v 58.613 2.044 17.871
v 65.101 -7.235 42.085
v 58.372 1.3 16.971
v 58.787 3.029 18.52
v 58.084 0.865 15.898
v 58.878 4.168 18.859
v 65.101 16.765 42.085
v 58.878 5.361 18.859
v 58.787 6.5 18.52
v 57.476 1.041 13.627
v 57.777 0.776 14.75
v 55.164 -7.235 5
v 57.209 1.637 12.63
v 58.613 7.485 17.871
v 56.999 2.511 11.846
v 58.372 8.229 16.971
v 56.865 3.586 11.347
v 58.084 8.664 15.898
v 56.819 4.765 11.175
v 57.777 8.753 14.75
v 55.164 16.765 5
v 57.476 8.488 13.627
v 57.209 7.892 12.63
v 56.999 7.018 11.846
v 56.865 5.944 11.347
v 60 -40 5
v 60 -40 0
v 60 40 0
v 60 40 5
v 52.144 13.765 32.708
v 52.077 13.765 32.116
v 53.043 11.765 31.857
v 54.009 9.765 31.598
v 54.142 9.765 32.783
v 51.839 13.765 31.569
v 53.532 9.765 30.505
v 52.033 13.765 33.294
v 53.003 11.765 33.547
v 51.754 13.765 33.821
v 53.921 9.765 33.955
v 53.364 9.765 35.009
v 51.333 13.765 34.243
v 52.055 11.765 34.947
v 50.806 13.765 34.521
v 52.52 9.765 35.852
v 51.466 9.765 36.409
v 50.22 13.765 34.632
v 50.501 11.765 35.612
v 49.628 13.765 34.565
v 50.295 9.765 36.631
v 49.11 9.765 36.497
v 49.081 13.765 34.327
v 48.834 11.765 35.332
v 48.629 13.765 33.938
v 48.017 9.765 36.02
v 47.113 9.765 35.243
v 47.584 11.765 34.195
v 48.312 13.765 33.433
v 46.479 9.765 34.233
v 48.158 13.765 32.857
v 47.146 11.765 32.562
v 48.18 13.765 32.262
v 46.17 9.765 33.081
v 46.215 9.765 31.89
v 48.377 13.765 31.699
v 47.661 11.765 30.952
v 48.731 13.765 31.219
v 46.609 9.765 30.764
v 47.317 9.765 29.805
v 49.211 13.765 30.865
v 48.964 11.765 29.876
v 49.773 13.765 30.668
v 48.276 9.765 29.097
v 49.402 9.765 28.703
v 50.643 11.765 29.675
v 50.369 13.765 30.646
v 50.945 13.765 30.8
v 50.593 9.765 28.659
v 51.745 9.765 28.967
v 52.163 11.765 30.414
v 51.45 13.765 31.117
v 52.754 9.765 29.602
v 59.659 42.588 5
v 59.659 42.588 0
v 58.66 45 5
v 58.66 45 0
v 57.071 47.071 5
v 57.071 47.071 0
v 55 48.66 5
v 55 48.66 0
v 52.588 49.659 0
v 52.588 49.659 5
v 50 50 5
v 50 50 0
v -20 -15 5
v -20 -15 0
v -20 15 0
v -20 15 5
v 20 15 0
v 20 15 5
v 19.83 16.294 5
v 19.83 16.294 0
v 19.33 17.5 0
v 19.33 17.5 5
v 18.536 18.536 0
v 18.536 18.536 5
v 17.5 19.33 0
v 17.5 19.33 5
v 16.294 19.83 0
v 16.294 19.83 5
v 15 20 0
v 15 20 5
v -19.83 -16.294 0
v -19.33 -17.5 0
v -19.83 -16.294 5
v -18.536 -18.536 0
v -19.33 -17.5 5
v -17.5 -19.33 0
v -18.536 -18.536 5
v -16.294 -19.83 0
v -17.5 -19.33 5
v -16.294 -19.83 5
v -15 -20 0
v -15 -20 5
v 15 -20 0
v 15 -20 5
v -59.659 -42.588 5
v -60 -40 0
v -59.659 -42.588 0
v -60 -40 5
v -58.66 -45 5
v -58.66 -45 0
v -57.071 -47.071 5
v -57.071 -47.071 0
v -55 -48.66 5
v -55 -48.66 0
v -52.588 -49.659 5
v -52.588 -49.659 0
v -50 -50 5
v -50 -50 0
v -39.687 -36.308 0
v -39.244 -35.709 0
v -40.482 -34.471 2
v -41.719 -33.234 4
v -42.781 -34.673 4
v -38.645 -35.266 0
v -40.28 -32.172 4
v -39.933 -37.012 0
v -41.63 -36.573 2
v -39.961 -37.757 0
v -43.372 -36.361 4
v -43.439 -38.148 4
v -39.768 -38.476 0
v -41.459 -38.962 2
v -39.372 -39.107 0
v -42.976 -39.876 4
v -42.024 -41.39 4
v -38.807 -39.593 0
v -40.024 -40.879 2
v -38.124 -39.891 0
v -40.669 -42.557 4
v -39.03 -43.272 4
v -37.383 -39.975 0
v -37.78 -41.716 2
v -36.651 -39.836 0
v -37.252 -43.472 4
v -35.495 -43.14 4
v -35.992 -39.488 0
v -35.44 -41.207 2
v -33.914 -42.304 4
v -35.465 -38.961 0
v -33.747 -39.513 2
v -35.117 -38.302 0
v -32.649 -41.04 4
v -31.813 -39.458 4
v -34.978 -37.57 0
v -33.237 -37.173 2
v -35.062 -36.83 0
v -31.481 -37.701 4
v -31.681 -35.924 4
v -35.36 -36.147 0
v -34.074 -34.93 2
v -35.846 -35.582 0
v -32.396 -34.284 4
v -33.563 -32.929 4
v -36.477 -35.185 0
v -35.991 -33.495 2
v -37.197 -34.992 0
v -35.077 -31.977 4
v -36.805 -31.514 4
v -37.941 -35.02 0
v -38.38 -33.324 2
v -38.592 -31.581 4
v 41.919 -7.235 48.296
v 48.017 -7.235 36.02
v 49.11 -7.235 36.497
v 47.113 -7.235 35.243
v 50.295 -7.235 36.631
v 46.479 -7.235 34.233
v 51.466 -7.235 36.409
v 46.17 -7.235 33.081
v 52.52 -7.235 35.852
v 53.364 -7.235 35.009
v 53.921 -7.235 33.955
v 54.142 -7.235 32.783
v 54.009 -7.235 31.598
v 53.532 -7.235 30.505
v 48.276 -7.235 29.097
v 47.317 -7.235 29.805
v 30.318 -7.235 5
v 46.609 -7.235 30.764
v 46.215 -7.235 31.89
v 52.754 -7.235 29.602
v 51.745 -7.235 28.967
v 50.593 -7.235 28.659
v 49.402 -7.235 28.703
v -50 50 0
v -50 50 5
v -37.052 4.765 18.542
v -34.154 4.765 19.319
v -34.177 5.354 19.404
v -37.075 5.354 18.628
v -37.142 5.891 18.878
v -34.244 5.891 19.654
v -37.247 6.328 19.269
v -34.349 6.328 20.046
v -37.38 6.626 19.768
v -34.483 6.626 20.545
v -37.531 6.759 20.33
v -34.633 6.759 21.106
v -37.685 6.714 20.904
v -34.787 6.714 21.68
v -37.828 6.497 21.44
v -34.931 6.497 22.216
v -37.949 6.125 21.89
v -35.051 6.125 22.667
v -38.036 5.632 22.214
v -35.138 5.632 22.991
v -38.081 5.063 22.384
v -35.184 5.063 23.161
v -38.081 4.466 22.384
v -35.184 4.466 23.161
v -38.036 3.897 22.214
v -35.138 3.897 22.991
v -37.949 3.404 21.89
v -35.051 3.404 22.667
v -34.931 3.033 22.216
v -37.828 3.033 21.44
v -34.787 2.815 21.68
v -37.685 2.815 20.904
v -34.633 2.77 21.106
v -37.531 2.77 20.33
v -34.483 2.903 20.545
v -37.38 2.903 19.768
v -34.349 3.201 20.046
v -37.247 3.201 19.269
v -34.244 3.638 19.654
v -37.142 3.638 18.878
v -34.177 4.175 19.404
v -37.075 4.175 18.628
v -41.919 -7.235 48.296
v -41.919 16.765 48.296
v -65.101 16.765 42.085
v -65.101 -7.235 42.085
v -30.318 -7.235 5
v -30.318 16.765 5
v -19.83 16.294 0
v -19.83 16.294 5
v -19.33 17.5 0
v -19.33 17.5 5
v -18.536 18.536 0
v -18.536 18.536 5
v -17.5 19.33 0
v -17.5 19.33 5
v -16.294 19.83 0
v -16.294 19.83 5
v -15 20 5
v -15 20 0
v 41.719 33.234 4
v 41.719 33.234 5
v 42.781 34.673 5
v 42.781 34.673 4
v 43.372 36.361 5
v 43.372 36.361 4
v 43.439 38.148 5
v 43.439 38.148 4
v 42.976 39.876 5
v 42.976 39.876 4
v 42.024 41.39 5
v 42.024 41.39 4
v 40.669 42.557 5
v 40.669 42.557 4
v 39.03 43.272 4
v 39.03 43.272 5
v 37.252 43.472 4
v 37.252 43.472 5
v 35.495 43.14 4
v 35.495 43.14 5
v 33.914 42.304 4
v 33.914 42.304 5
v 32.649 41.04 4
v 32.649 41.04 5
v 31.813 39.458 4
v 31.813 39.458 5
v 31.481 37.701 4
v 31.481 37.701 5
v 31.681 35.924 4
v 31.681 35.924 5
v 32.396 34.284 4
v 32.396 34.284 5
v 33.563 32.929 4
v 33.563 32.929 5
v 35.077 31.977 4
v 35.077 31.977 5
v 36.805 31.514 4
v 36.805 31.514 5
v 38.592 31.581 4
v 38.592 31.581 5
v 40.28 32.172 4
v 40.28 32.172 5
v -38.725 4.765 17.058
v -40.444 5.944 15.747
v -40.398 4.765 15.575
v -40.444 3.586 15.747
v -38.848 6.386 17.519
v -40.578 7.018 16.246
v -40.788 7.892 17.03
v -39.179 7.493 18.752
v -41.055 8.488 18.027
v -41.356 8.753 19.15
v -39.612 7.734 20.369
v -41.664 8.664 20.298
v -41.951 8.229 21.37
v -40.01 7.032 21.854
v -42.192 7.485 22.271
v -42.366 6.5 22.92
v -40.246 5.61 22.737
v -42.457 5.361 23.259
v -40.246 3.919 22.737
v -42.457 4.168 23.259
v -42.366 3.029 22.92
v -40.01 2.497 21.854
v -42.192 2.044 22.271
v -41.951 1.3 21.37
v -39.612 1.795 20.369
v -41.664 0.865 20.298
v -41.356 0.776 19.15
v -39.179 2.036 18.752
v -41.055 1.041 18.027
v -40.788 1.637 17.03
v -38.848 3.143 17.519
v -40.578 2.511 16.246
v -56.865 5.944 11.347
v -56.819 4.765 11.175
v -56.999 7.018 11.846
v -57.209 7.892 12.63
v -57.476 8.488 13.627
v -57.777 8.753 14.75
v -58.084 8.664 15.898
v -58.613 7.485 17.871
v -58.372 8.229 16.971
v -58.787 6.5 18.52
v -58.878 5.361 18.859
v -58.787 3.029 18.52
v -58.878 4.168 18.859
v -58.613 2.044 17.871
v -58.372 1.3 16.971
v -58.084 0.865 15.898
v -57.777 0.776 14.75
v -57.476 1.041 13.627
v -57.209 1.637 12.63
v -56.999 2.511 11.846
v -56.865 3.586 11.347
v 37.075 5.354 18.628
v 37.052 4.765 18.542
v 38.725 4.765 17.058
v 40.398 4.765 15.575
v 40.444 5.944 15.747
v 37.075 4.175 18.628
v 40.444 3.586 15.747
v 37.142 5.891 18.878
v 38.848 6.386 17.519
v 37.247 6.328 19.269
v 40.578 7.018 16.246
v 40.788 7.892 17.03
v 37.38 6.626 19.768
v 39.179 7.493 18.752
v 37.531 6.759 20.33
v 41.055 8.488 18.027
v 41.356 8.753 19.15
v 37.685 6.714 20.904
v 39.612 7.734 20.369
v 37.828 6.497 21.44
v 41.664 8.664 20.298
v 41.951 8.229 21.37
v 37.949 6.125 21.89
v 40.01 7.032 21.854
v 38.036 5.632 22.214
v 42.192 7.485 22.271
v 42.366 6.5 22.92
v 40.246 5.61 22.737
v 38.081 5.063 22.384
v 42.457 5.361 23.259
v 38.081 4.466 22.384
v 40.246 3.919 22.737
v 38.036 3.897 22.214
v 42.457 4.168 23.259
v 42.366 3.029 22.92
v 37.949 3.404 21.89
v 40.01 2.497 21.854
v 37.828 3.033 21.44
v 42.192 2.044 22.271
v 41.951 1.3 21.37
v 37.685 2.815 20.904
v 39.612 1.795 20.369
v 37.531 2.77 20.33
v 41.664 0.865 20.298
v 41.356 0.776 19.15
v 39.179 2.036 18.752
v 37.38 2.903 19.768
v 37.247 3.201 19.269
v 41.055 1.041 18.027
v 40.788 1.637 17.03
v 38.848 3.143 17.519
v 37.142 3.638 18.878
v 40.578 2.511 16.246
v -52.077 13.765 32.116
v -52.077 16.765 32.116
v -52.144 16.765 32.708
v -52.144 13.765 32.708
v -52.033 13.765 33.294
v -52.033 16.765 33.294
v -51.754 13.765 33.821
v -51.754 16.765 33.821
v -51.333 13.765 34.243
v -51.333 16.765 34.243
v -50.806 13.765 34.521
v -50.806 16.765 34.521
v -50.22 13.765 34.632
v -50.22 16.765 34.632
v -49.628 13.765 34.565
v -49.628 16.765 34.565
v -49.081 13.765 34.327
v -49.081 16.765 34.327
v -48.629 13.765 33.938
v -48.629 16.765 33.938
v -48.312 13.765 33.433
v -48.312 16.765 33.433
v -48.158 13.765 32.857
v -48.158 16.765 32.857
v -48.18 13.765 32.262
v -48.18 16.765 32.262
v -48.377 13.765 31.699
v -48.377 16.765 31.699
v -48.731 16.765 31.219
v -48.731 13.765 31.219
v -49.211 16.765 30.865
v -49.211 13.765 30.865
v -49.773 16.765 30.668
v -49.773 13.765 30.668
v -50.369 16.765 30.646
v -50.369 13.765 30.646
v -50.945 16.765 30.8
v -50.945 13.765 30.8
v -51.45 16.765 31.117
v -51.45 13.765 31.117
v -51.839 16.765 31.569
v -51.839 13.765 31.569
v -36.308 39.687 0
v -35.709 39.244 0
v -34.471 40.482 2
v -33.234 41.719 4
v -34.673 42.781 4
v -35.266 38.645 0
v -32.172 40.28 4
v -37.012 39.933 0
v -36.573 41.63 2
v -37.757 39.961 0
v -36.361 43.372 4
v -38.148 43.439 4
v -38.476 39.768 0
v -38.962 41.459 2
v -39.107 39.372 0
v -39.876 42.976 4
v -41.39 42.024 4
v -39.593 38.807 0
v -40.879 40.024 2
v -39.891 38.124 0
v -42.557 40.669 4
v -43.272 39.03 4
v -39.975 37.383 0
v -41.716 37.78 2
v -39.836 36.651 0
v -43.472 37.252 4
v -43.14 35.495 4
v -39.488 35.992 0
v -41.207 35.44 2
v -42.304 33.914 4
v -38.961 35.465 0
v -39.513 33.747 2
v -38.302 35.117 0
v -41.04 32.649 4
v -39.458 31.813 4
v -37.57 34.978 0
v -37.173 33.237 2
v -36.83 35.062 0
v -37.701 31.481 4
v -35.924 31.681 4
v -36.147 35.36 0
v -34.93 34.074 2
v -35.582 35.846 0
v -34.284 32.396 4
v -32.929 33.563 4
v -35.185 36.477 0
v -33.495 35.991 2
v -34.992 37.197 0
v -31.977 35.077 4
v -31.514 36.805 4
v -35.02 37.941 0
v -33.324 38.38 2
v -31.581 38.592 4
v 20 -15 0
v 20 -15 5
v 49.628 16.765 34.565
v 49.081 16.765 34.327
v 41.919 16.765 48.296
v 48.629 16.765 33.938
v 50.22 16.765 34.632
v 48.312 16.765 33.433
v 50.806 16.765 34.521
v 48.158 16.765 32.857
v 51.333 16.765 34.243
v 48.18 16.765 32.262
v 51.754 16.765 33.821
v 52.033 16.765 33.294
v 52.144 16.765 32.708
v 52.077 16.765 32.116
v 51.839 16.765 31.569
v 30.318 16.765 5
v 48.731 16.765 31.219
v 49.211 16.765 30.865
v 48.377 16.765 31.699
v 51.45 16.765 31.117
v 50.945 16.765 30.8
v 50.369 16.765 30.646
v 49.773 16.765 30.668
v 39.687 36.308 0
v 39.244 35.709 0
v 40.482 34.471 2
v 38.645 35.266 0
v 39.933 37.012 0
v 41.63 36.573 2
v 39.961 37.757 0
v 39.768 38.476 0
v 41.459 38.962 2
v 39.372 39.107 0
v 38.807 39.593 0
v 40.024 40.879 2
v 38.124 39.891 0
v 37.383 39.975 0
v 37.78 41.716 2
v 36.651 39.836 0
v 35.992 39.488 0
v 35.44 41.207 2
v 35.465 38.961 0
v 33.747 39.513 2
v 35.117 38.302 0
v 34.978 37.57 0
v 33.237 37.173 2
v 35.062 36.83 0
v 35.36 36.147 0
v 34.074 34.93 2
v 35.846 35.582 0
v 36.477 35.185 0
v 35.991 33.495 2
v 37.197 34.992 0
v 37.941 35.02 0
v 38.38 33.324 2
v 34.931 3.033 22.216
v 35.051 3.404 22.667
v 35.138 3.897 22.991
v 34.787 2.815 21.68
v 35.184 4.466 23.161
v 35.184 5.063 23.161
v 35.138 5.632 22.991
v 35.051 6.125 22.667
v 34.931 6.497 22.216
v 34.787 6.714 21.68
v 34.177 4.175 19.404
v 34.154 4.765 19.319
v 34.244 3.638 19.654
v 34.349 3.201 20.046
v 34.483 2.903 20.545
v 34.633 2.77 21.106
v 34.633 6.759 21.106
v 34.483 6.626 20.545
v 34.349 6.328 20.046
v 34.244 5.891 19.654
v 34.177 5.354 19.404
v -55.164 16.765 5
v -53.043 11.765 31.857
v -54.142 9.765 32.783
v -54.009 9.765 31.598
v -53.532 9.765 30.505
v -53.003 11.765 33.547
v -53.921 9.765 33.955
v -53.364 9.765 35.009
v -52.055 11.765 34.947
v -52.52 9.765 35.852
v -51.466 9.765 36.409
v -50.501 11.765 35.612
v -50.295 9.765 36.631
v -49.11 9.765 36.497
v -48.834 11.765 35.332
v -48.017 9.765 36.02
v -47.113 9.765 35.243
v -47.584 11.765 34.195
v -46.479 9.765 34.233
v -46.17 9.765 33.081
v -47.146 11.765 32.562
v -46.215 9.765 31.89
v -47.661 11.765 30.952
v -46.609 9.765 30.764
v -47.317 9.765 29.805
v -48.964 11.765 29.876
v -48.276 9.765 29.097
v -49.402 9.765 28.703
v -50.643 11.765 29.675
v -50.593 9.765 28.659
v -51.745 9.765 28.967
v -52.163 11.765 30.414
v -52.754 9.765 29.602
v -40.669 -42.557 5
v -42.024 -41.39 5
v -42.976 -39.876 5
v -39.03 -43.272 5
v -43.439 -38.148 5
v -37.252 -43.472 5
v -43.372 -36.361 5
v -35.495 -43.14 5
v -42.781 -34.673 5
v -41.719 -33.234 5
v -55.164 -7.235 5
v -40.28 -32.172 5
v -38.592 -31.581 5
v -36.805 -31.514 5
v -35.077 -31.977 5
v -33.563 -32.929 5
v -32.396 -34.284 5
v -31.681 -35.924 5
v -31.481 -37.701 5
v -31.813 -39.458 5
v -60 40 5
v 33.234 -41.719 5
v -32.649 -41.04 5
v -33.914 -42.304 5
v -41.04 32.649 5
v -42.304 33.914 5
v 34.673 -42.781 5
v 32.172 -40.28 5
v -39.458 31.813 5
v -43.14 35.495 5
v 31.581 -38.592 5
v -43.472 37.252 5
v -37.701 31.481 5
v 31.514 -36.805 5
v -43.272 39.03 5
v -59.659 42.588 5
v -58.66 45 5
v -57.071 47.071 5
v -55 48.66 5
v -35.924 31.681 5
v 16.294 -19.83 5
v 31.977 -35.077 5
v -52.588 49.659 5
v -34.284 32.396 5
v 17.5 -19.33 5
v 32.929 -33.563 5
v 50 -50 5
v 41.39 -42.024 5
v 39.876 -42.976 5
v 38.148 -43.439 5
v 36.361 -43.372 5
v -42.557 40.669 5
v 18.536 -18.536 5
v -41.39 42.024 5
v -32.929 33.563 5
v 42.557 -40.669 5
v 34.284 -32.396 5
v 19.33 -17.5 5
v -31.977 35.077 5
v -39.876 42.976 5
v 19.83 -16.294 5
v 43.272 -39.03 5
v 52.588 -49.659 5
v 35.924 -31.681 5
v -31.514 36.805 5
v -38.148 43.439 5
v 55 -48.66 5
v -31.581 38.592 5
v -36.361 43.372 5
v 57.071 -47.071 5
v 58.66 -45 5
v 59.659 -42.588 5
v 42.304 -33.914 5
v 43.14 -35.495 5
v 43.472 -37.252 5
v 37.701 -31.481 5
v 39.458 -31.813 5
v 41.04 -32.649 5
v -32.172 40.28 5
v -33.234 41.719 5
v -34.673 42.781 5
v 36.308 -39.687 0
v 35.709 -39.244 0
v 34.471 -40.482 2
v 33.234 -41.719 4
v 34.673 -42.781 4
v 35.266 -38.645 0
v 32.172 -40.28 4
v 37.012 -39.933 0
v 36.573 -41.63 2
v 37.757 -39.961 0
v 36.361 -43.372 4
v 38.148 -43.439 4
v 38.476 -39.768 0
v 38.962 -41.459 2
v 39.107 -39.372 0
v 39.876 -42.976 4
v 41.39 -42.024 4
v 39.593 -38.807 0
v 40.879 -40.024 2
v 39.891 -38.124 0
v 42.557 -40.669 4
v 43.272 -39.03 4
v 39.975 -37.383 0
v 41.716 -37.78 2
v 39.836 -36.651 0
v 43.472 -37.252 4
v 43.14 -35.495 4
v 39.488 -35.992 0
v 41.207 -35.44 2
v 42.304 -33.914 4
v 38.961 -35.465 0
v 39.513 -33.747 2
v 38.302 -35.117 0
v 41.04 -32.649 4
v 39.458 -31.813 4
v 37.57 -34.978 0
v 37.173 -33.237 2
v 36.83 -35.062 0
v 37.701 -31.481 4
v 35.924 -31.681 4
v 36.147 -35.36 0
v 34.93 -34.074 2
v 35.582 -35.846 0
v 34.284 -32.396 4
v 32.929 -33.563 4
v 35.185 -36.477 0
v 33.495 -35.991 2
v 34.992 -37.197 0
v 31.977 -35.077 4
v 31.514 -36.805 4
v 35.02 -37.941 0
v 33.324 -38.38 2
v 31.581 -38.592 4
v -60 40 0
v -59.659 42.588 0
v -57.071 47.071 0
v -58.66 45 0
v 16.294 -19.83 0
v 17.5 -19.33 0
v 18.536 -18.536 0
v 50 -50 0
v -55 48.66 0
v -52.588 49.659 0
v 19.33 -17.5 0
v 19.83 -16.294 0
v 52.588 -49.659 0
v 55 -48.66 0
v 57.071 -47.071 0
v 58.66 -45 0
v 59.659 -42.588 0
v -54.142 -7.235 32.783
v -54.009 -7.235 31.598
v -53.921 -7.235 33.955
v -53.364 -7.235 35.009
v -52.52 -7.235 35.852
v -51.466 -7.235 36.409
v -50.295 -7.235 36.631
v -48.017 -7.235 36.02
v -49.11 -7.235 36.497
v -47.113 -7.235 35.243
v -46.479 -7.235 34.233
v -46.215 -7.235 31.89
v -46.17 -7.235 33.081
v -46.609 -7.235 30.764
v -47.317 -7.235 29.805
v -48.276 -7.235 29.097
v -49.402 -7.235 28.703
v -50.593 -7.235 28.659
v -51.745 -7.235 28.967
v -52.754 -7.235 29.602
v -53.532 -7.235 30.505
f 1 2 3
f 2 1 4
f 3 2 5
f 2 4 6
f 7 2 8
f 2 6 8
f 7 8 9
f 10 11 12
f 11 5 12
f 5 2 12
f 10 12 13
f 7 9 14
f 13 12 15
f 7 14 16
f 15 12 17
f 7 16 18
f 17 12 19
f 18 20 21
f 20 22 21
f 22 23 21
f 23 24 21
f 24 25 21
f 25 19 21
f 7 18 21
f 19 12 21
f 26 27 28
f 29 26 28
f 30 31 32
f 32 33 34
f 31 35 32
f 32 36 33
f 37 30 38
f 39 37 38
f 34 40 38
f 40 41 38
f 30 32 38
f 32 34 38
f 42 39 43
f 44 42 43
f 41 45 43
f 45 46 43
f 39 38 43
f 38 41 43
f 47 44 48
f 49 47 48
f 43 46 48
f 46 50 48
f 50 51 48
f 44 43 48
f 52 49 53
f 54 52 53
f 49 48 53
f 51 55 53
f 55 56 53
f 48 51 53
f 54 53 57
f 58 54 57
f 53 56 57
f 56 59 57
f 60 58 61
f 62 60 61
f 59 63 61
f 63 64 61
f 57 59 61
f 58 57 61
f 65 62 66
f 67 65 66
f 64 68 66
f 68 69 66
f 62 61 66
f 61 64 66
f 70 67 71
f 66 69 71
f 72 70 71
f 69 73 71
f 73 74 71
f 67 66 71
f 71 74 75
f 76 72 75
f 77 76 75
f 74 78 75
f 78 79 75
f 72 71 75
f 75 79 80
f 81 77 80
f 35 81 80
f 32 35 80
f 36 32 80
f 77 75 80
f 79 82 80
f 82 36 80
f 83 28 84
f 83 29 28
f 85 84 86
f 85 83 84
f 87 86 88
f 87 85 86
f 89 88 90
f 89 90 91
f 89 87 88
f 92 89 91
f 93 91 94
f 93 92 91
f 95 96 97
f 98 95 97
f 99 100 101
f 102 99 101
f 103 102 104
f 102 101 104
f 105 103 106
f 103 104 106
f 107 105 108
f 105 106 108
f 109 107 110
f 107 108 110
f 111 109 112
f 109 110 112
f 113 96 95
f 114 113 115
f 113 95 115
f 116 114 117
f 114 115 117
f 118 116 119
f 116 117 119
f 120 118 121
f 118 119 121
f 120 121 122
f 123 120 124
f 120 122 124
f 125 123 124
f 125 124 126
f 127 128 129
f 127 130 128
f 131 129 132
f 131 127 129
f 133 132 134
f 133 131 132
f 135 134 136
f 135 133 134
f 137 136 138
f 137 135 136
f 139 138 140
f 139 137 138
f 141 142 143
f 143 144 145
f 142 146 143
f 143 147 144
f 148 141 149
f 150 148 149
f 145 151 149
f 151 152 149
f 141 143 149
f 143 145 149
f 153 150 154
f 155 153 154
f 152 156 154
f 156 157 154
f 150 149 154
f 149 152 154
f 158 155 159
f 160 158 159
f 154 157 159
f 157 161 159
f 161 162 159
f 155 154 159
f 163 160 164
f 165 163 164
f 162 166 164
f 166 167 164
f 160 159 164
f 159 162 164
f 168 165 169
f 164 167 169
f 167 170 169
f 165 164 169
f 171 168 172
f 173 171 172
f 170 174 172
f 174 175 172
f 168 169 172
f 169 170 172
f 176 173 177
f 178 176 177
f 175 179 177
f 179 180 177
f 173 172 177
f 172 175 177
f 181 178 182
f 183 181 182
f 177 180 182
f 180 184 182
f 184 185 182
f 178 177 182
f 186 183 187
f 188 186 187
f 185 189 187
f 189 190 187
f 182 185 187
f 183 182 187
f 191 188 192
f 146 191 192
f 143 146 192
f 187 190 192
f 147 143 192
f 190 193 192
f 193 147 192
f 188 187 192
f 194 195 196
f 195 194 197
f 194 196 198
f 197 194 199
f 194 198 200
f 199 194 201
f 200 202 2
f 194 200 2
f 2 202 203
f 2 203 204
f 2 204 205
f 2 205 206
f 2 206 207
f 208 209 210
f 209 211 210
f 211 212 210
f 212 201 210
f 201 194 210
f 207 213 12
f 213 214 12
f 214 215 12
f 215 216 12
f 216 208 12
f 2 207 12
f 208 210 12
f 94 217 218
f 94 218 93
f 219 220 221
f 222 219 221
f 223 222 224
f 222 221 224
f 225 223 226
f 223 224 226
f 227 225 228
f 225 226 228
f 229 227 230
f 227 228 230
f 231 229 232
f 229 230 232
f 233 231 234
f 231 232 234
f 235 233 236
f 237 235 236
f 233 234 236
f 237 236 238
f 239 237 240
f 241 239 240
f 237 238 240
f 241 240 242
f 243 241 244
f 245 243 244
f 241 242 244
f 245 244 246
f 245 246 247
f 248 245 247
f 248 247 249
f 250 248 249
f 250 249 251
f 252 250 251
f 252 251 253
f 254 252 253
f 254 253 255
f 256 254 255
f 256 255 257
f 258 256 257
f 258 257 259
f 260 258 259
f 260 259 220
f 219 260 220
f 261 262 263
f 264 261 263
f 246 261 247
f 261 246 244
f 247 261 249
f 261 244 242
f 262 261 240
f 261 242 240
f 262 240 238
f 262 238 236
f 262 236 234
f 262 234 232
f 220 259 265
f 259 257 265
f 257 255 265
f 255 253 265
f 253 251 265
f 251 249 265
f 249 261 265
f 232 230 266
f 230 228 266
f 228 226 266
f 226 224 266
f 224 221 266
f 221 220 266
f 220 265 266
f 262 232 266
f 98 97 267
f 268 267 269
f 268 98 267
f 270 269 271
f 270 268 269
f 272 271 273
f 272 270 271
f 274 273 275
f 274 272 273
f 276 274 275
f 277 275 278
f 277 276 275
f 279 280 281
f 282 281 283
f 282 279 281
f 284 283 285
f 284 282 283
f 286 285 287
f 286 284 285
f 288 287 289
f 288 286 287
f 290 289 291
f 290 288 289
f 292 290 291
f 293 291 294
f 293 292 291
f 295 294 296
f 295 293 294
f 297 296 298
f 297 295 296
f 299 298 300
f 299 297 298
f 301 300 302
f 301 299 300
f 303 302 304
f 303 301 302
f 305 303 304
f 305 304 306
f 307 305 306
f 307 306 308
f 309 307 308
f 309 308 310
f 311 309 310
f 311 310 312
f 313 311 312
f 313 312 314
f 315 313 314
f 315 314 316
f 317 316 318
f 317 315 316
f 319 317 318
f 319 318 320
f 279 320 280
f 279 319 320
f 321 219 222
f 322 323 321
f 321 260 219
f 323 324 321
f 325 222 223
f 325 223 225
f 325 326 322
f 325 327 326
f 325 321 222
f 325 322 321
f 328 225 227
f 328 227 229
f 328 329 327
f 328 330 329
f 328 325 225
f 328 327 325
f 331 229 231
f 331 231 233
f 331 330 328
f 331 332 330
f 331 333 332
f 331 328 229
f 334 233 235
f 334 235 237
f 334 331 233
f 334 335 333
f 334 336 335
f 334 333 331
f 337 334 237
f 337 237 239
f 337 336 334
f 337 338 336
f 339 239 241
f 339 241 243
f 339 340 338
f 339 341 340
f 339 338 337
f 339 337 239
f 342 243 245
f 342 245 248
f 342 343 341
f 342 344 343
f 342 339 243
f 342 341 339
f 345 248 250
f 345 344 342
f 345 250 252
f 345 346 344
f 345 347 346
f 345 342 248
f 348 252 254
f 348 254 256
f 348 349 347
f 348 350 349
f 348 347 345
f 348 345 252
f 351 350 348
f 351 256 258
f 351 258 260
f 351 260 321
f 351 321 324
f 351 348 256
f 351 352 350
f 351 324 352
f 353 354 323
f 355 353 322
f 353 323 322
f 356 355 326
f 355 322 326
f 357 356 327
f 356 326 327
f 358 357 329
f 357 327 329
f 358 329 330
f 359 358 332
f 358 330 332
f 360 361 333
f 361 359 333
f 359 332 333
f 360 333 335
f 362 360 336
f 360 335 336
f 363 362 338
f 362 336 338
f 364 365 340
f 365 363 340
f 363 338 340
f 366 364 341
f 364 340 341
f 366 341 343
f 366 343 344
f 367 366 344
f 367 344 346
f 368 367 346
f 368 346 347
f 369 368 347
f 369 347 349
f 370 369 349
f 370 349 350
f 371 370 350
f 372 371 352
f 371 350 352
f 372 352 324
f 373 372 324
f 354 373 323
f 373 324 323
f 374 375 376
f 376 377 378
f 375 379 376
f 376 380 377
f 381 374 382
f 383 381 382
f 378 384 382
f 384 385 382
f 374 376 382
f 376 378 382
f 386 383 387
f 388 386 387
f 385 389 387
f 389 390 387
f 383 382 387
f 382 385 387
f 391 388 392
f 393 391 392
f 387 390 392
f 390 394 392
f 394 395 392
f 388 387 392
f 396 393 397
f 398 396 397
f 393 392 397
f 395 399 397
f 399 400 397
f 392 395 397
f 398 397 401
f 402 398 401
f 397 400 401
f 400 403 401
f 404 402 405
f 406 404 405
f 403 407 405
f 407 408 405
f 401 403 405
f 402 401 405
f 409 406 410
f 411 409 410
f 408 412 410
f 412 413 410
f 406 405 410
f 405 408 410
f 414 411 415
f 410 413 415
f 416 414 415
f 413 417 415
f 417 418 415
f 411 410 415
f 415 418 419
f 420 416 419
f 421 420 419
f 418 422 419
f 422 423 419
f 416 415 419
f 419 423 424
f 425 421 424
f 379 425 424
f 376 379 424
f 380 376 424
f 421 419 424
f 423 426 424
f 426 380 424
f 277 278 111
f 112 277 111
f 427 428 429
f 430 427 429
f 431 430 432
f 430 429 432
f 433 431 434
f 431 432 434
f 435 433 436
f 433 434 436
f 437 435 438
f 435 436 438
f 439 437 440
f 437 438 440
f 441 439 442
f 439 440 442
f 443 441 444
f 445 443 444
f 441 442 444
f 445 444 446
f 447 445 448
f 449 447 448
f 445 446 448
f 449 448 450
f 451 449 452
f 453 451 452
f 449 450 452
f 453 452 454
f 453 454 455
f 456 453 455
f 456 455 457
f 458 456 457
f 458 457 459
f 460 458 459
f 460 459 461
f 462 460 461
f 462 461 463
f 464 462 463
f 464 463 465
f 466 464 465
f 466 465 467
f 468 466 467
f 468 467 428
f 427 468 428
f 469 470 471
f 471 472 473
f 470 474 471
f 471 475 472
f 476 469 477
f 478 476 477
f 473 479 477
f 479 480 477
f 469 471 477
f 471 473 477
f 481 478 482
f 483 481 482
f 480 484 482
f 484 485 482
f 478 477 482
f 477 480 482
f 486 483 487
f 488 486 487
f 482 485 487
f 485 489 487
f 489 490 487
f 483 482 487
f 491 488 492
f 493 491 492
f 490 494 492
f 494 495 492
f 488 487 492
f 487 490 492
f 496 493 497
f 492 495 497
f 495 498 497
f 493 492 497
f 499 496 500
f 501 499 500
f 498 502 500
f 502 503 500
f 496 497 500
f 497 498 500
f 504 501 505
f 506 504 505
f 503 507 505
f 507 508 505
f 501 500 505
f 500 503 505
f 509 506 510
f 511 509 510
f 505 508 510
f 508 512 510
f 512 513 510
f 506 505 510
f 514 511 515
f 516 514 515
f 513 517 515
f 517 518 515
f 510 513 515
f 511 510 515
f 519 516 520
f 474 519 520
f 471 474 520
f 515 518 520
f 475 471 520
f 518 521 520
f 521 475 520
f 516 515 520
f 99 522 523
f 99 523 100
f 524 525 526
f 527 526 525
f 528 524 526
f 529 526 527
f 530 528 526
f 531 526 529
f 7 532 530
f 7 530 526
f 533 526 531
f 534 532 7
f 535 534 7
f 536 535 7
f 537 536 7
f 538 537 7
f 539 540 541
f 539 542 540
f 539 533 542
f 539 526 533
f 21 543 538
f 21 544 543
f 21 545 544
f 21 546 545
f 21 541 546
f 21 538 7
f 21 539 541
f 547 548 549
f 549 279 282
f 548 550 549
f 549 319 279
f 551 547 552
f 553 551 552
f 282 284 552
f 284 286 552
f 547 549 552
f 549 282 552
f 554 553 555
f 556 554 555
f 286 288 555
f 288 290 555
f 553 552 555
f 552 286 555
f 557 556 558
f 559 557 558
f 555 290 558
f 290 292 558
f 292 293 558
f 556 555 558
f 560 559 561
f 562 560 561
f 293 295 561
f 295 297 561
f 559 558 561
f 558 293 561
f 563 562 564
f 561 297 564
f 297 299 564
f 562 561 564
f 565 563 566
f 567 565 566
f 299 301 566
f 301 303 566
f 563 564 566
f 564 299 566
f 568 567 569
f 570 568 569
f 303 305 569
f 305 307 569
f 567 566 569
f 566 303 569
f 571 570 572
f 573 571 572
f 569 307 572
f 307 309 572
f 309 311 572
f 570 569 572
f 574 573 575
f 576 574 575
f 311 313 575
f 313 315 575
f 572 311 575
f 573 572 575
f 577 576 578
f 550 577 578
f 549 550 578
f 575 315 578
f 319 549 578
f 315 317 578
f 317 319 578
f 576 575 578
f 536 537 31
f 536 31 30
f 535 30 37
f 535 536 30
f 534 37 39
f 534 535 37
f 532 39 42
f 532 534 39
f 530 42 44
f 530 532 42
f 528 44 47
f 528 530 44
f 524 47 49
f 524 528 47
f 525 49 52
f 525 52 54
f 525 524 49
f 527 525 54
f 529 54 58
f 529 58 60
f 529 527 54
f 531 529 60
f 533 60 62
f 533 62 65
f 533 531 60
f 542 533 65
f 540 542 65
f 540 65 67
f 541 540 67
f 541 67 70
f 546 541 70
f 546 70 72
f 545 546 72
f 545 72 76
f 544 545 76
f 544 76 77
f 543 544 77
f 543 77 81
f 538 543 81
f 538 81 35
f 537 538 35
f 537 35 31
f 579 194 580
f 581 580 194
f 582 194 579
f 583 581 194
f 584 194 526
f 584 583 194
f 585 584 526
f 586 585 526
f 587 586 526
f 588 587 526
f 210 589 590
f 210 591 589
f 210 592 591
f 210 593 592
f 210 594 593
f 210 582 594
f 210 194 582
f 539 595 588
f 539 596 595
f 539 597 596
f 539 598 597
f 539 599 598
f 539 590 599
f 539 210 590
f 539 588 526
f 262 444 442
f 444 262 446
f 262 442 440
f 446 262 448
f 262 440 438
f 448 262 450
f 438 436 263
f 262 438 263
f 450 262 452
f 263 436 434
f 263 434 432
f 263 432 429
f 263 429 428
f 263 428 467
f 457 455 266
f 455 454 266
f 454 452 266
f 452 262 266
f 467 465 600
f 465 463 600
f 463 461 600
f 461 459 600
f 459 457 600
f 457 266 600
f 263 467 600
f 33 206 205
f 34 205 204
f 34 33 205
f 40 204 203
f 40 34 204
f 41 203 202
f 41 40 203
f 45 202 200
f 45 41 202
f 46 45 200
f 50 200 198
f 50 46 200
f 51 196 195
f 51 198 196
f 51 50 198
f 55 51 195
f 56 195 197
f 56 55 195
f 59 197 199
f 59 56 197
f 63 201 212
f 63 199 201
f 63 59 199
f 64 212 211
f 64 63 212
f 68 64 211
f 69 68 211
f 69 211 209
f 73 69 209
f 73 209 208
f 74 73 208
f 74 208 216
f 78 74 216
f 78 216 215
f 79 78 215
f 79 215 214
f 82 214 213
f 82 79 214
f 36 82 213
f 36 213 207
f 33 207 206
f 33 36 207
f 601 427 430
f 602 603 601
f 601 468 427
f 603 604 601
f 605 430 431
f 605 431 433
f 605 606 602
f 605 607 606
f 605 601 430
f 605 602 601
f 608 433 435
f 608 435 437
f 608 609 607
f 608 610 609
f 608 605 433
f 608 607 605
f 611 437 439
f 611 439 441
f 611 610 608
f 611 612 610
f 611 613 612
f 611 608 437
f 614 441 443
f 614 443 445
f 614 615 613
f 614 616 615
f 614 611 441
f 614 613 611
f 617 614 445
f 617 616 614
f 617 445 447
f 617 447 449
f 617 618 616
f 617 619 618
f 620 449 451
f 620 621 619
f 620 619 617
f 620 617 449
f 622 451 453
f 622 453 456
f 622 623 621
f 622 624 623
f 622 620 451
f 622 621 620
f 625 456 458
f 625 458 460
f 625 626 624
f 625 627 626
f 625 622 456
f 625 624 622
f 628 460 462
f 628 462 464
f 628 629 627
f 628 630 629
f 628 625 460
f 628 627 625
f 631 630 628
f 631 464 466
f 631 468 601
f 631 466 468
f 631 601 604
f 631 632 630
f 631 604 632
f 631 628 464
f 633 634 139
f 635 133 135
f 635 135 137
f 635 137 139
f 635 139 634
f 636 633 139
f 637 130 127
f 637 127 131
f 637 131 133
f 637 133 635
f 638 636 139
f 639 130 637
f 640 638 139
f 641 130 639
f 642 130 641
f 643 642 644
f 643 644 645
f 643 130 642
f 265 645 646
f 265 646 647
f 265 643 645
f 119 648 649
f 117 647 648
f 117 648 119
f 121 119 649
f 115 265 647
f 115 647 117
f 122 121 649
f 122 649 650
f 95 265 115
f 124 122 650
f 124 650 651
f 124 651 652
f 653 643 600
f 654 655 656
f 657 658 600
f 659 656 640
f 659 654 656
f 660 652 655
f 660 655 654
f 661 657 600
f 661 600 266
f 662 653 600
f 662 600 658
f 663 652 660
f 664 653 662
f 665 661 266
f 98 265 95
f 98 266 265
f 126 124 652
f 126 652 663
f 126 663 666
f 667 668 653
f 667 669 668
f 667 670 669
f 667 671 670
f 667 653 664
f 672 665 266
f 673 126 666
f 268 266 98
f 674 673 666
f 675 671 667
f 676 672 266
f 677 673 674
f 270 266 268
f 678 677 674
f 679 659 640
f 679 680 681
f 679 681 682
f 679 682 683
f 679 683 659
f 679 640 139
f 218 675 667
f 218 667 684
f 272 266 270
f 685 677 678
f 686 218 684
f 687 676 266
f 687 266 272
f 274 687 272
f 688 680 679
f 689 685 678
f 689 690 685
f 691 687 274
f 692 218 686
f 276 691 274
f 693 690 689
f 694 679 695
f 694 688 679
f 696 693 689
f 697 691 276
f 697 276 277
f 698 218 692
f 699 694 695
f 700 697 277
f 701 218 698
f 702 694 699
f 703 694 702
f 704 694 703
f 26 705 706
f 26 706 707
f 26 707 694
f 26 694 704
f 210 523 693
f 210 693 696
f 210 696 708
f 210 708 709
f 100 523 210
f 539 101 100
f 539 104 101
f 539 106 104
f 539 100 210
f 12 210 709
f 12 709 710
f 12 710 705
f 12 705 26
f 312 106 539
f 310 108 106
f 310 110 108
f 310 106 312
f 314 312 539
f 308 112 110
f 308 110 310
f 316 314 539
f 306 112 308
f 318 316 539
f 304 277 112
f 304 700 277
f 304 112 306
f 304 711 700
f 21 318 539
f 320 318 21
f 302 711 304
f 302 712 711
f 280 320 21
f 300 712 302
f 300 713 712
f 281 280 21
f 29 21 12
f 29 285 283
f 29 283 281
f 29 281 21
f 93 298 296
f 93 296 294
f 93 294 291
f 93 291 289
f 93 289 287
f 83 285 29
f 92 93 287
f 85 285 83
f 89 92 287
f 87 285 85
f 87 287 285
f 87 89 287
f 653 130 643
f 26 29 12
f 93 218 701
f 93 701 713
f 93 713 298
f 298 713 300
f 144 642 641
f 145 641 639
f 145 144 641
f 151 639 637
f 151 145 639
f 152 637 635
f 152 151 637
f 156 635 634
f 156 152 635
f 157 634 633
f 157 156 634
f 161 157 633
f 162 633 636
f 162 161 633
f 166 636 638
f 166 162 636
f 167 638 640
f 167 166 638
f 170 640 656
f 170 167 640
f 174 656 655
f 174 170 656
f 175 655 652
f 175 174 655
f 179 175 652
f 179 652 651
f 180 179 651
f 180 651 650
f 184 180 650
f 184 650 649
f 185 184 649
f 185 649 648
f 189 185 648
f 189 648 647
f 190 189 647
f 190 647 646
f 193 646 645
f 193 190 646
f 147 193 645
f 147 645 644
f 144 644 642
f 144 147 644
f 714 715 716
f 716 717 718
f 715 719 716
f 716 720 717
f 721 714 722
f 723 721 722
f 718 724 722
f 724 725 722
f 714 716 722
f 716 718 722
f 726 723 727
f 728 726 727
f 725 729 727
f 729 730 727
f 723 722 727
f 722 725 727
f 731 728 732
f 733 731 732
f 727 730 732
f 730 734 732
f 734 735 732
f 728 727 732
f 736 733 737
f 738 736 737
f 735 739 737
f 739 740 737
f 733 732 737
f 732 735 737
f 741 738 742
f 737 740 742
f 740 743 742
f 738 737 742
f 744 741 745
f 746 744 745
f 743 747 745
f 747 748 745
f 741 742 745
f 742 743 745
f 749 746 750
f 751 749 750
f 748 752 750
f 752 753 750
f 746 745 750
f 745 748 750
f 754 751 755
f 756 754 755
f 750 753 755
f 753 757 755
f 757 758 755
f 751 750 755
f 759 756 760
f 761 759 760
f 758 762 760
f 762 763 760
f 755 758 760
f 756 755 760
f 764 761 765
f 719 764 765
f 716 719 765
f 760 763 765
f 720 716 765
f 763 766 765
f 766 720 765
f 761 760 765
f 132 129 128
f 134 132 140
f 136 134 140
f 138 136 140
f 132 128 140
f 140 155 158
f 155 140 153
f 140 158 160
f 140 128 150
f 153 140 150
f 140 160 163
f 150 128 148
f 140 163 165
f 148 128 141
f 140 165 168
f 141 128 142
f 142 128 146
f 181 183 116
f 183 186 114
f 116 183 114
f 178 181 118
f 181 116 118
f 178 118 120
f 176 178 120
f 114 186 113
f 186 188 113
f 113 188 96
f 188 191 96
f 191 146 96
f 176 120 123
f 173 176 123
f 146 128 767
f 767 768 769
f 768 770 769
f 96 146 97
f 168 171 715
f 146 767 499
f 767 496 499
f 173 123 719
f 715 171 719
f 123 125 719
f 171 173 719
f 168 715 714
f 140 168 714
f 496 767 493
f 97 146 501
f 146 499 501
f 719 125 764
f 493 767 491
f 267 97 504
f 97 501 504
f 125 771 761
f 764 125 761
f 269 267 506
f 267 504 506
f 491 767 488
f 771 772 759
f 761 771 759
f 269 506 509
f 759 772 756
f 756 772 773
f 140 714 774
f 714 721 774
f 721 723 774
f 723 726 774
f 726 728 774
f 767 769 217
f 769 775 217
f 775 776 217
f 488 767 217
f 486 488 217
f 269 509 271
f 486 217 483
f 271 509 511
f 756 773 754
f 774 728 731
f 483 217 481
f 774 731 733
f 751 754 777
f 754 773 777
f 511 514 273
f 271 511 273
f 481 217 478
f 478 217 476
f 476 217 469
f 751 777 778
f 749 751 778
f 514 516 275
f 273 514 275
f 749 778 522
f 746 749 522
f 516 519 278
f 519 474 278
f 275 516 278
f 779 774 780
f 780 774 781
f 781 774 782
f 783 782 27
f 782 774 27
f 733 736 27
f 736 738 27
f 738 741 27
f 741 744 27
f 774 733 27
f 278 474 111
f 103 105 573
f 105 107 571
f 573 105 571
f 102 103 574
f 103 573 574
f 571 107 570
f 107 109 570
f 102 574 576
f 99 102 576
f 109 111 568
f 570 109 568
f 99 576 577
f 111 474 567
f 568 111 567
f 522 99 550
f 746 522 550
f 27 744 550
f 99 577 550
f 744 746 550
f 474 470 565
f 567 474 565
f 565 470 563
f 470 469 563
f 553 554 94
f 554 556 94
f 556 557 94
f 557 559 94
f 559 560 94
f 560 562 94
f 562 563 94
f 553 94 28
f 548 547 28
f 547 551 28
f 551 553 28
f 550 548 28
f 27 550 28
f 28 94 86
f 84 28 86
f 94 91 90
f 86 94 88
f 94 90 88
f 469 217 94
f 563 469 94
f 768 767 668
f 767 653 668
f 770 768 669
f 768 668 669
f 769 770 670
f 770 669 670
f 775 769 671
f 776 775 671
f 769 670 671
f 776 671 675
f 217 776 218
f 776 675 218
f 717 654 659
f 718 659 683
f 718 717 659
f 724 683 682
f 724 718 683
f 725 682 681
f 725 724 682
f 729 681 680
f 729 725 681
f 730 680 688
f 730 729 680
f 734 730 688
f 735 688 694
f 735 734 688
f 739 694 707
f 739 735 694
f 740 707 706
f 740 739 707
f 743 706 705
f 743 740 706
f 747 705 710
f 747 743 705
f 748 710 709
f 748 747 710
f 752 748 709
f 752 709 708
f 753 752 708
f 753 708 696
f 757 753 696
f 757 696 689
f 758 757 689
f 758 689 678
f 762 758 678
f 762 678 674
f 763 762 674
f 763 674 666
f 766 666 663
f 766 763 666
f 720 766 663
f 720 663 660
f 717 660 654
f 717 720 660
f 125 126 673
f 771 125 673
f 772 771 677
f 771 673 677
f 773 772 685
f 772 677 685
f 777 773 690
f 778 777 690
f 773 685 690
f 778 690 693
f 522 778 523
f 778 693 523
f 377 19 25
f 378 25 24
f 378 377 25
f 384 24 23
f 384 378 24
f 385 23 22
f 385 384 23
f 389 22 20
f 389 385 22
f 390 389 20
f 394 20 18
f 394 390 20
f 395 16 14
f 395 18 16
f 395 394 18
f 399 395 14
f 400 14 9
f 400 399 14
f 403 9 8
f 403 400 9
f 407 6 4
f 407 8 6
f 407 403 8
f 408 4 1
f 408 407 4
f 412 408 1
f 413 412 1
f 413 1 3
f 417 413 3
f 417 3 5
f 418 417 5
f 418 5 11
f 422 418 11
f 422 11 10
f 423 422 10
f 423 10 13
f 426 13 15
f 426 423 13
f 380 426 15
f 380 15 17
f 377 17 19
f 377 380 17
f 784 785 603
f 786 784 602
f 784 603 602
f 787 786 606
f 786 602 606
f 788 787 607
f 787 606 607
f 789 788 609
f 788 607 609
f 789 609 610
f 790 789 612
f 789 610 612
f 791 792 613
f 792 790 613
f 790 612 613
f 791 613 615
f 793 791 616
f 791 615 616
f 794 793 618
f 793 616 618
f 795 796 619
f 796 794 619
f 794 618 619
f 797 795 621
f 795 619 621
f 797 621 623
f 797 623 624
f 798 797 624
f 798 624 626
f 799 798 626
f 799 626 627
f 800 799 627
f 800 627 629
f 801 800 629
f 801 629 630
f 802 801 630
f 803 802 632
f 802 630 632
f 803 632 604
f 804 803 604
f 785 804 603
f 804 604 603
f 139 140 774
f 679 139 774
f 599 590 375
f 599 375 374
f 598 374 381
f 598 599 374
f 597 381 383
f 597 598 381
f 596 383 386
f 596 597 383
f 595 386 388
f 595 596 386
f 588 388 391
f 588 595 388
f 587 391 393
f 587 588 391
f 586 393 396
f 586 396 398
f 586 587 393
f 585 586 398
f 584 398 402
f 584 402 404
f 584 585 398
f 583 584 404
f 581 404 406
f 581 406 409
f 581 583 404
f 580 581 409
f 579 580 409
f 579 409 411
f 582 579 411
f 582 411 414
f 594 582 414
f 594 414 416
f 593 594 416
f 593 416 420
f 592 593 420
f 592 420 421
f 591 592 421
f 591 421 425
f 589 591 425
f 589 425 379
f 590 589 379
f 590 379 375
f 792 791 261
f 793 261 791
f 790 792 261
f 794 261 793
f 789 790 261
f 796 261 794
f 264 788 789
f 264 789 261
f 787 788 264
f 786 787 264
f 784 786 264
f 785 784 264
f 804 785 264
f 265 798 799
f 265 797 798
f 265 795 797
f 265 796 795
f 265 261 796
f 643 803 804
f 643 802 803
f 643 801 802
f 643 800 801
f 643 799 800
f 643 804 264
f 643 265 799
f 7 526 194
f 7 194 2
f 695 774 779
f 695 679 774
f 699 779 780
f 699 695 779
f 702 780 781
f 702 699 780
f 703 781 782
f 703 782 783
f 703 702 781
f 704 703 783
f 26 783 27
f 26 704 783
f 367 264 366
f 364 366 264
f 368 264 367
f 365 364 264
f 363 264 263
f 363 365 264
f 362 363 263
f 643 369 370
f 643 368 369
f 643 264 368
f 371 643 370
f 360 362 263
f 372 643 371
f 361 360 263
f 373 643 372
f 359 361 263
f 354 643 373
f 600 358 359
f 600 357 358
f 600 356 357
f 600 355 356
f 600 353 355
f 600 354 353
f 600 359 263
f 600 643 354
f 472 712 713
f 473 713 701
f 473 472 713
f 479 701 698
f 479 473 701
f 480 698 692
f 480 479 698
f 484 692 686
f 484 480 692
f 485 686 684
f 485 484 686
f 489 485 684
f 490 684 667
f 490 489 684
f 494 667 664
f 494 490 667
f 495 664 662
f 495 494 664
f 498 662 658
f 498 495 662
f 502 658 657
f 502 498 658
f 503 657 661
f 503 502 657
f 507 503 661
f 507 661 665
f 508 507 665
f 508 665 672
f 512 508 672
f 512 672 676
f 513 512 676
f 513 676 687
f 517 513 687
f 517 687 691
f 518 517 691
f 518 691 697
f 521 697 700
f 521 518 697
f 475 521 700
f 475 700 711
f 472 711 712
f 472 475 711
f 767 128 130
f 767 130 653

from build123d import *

# Parameters (mm, degrees)
CYLINDER_R               = 6
CYLINDER_DEPTH           = 60
CYLINDER001_R            = 2.5
CYLINDER001_DEPTH        = 40
ARRAY001_COUNT           = 4
ARRAY001_PLACEMENT_ANGLE = 45
BOX007_W                 = 40
BOX007_H                 = 40
BOX007_DEPTH             = 10
FILLET001_R              = 5
CYLINDER003_R            = 70
CYLINDER003_DEPTH        = 20
CYLINDER004_R            = 4
CYLINDER004_DEPTH        = 60
CYLINDER005_R            = 2
CYLINDER005_DEPTH        = 40
BODY004_PLACEMENT_ANGLE  = 90
BODY003_PLACEMENT_ANGLE  = 90
BOX005_W                 = 24
BOX005_H                 = 24
BOX005_DEPTH             = 50
CUT002_PLACEMENT_ANGLE   = 15
BOX006_W                 = 120
BOX006_H                 = 100
BOX006_DEPTH             = 5
FILLET_R                 = 10


with BuildPart() as cone001:
    # Cone001 → Cone001 (revolve)
    with BuildSketch(Plane.XZ):
        Polygon((0, 0), (2.5, 0), (6, 4), (0, 4), align=None)
    revolve(axis=Axis((0, 0, 0), (0, 0, 1)))


with BuildPart() as cylinder:
    # Cylinder → Cylinder (new body)
    with BuildSketch(Plane.XY.offset(4)):
        Circle(CYLINDER_R)
    extrude(amount=CYLINDER_DEPTH)


with BuildPart() as screw_hole_clone:
    # Cylinder001 → Cylinder001 (new body)
    with BuildSketch(Plane.XY.offset(-40)):
        Circle(CYLINDER001_R)
    extrude(amount=CYLINDER001_DEPTH)

    # Fusion002: union Cone001, Cylinder
    add(cone001.part)
    add(cylinder.part)


with BuildPart() as screw_hole_clone_1:
    # Fusion002 placement: moved
    add(screw_hole_clone.part.moved(Location((0, 0, 5))))


with BuildPart() as screw_hole_clone_2:
    # Body001 placement: moved
    add(screw_hole_clone_1.part.moved(Location((0, 0, -5))))


with BuildPart() as array001:
    # Body002 base: copy of screw hole clone
    add(screw_hole_clone_2.part)


with BuildPart() as array001_1:
    # Body002 placement: moved
    add(array001.part.moved(Location((0, 53, 0))))

    # Array001: Array001 ×4 about axis
    array001_axis = Axis((0, 0, 0), (0, 0, 1))


with BuildPart() as array001_2:
    add(array001_1.part)
    for i in range(1, ARRAY001_COUNT):
        add(array001_1.part.rotate(array001_axis, i * 360 / ARRAY001_COUNT))


with BuildPart() as array001_3:
    # Array001 placement: moved
    add(array001_2.part.rotate(Axis((0, 0, 0), (0, 0, 1)), ARRAY001_PLACEMENT_ANGLE))


with BuildPart() as central_hole_cube_fillet:
    # Box007 → Box007 (new body)
    with BuildSketch(Plane(origin=(-20, -20, 0), x_dir=(1, 0, 0), z_dir=(0, 0, 1))):
        with Locations((20, 20)):
            Rectangle(BOX007_W, BOX007_H)
    extrude(amount=BOX007_DEPTH)

    # Fillet001
    fillet001_edges = [central_hole_cube_fillet.edges().sort_by_distance(p)[0] for p in [
        (-20, -20, 5),
        (-20, 20, 5),
        (20, -20, 5),
        (20, 20, 5),
    ]]
    fillet(fillet001_edges, radius=FILLET001_R)


with BuildPart() as extraction_fusion:
    # Cylinder003 → Cylinder003 (new body)
    with BuildSketch(Plane.XY.offset(-20)):
        Circle(CYLINDER003_R)
    extrude(amount=CYLINDER003_DEPTH)

    # Fusion006: union screw hole clone, Array001, central hole cube fillet
    add(screw_hole_clone_2.part)
    add(array001_3.part)
    add(central_hole_cube_fillet.part)


with BuildPart() as cone002:
    # Cone002 → Cone002 (revolve)
    with BuildSketch(Plane.XZ):
        Polygon((0, 0), (2, 0), (4, 4), (0, 4), align=None)
    revolve(axis=Axis((0, 0, 0), (0, 0, 1)))


with BuildPart() as cylinder004:
    # Cylinder004 → Cylinder004 (new body)
    with BuildSketch(Plane.XY.offset(4)):
        Circle(CYLINDER004_R)
    extrude(amount=CYLINDER004_DEPTH)


with BuildPart() as m3_screw_hole_fusion:
    # Cylinder005 → Cylinder005 (new body)
    with BuildSketch(Plane.XY.offset(-40)):
        Circle(CYLINDER005_R)
    extrude(amount=CYLINDER005_DEPTH)

    # Fusion007: union Cone002, Cylinder004
    add(cone002.part)
    add(cylinder004.part)


with BuildPart() as m3_screw_hole_fusion_1:
    # Fusion007 placement: moved
    add(m3_screw_hole_fusion.part.moved(Location((0, 0, 5))))


with BuildPart() as m3_screw_hole_fusion_clone001:
    # Body004 base: copy of m3 screw hole fusion
    add(m3_screw_hole_fusion_1.part)


with BuildPart() as m3_screw_hole_fusion_clone001_1:
    # Body004 placement: moved
    add(m3_screw_hole_fusion_clone001.part.moved(Location((12, 26, 37))).rotate(Axis((12, 26, 37), (1, 0, 0)), BODY004_PLACEMENT_ANGLE))


with BuildPart() as m3_hole_fusion:
    # Body003 base: copy of m3 screw hole fusion
    add(m3_screw_hole_fusion_1.part)


with BuildPart() as m3_hole_fusion_1:
    # Body003 placement: moved
    add(m3_hole_fusion.part.moved(Location((-2, 12, 22))).rotate(Axis((-2, 12, 22), (0, 1, 0)), BODY003_PLACEMENT_ANGLE))

    # Fusion008: union m3 screw hole fusion clone001
    add(m3_screw_hole_fusion_clone001_1.part)


with BuildPart() as cube_cut:
    # Box005 → Box005 (new body)
    with BuildSketch(Plane.XY):
        with Locations((12, 12)):
            Rectangle(BOX005_W, BOX005_H)
    extrude(amount=BOX005_DEPTH)

    # Cut002: cut m3 hole fusion
    add(m3_hole_fusion_1.part, mode=Mode.SUBTRACT)


with BuildPart() as cube_cut_1:
    # Cut002 placement: moved
    add(cube_cut.part.moved(Location((28.9778, -7.23543, 0))).rotate(Axis((28.9778, -7.23543, 0), (0, 1, 0)), CUT002_PLACEMENT_ANGLE))


with BuildPart() as base_cube_fillet:
    # Box006 → Box006 (new body)
    with BuildSketch(Plane(origin=(-60, -50, 0), x_dir=(1, 0, 0), z_dir=(0, 0, 1))):
        with Locations((60, 50)):
            Rectangle(BOX006_W, BOX006_H)
    extrude(amount=BOX006_DEPTH)

    # Fillet
    fillet_edges = [base_cube_fillet.edges().sort_by_distance(p)[0] for p in [
        (-60, -50, 2.5),
        (-60, 50, 2.5),
        (60, -50, 2.5),
        (60, 50, 2.5),
    ]]
    fillet(fillet_edges, radius=FILLET_R)


with BuildPart() as stand_cut_v2:
    # Part__Mirroring001: instance of cube cut
    add(cube_cut_1.part.mirror(Plane(origin=(0, 7, 0), x_dir=(0, -1, 0), z_dir=(1, 0, 0))))

    # Fusion005: union cube cut, base cube fillet
    add(cube_cut_1.part)
    add(base_cube_fillet.part)

    # Cut001: cut extraction fusion
    add(extraction_fusion.part, mode=Mode.SUBTRACT)


solid = stand_cut_v2.part
